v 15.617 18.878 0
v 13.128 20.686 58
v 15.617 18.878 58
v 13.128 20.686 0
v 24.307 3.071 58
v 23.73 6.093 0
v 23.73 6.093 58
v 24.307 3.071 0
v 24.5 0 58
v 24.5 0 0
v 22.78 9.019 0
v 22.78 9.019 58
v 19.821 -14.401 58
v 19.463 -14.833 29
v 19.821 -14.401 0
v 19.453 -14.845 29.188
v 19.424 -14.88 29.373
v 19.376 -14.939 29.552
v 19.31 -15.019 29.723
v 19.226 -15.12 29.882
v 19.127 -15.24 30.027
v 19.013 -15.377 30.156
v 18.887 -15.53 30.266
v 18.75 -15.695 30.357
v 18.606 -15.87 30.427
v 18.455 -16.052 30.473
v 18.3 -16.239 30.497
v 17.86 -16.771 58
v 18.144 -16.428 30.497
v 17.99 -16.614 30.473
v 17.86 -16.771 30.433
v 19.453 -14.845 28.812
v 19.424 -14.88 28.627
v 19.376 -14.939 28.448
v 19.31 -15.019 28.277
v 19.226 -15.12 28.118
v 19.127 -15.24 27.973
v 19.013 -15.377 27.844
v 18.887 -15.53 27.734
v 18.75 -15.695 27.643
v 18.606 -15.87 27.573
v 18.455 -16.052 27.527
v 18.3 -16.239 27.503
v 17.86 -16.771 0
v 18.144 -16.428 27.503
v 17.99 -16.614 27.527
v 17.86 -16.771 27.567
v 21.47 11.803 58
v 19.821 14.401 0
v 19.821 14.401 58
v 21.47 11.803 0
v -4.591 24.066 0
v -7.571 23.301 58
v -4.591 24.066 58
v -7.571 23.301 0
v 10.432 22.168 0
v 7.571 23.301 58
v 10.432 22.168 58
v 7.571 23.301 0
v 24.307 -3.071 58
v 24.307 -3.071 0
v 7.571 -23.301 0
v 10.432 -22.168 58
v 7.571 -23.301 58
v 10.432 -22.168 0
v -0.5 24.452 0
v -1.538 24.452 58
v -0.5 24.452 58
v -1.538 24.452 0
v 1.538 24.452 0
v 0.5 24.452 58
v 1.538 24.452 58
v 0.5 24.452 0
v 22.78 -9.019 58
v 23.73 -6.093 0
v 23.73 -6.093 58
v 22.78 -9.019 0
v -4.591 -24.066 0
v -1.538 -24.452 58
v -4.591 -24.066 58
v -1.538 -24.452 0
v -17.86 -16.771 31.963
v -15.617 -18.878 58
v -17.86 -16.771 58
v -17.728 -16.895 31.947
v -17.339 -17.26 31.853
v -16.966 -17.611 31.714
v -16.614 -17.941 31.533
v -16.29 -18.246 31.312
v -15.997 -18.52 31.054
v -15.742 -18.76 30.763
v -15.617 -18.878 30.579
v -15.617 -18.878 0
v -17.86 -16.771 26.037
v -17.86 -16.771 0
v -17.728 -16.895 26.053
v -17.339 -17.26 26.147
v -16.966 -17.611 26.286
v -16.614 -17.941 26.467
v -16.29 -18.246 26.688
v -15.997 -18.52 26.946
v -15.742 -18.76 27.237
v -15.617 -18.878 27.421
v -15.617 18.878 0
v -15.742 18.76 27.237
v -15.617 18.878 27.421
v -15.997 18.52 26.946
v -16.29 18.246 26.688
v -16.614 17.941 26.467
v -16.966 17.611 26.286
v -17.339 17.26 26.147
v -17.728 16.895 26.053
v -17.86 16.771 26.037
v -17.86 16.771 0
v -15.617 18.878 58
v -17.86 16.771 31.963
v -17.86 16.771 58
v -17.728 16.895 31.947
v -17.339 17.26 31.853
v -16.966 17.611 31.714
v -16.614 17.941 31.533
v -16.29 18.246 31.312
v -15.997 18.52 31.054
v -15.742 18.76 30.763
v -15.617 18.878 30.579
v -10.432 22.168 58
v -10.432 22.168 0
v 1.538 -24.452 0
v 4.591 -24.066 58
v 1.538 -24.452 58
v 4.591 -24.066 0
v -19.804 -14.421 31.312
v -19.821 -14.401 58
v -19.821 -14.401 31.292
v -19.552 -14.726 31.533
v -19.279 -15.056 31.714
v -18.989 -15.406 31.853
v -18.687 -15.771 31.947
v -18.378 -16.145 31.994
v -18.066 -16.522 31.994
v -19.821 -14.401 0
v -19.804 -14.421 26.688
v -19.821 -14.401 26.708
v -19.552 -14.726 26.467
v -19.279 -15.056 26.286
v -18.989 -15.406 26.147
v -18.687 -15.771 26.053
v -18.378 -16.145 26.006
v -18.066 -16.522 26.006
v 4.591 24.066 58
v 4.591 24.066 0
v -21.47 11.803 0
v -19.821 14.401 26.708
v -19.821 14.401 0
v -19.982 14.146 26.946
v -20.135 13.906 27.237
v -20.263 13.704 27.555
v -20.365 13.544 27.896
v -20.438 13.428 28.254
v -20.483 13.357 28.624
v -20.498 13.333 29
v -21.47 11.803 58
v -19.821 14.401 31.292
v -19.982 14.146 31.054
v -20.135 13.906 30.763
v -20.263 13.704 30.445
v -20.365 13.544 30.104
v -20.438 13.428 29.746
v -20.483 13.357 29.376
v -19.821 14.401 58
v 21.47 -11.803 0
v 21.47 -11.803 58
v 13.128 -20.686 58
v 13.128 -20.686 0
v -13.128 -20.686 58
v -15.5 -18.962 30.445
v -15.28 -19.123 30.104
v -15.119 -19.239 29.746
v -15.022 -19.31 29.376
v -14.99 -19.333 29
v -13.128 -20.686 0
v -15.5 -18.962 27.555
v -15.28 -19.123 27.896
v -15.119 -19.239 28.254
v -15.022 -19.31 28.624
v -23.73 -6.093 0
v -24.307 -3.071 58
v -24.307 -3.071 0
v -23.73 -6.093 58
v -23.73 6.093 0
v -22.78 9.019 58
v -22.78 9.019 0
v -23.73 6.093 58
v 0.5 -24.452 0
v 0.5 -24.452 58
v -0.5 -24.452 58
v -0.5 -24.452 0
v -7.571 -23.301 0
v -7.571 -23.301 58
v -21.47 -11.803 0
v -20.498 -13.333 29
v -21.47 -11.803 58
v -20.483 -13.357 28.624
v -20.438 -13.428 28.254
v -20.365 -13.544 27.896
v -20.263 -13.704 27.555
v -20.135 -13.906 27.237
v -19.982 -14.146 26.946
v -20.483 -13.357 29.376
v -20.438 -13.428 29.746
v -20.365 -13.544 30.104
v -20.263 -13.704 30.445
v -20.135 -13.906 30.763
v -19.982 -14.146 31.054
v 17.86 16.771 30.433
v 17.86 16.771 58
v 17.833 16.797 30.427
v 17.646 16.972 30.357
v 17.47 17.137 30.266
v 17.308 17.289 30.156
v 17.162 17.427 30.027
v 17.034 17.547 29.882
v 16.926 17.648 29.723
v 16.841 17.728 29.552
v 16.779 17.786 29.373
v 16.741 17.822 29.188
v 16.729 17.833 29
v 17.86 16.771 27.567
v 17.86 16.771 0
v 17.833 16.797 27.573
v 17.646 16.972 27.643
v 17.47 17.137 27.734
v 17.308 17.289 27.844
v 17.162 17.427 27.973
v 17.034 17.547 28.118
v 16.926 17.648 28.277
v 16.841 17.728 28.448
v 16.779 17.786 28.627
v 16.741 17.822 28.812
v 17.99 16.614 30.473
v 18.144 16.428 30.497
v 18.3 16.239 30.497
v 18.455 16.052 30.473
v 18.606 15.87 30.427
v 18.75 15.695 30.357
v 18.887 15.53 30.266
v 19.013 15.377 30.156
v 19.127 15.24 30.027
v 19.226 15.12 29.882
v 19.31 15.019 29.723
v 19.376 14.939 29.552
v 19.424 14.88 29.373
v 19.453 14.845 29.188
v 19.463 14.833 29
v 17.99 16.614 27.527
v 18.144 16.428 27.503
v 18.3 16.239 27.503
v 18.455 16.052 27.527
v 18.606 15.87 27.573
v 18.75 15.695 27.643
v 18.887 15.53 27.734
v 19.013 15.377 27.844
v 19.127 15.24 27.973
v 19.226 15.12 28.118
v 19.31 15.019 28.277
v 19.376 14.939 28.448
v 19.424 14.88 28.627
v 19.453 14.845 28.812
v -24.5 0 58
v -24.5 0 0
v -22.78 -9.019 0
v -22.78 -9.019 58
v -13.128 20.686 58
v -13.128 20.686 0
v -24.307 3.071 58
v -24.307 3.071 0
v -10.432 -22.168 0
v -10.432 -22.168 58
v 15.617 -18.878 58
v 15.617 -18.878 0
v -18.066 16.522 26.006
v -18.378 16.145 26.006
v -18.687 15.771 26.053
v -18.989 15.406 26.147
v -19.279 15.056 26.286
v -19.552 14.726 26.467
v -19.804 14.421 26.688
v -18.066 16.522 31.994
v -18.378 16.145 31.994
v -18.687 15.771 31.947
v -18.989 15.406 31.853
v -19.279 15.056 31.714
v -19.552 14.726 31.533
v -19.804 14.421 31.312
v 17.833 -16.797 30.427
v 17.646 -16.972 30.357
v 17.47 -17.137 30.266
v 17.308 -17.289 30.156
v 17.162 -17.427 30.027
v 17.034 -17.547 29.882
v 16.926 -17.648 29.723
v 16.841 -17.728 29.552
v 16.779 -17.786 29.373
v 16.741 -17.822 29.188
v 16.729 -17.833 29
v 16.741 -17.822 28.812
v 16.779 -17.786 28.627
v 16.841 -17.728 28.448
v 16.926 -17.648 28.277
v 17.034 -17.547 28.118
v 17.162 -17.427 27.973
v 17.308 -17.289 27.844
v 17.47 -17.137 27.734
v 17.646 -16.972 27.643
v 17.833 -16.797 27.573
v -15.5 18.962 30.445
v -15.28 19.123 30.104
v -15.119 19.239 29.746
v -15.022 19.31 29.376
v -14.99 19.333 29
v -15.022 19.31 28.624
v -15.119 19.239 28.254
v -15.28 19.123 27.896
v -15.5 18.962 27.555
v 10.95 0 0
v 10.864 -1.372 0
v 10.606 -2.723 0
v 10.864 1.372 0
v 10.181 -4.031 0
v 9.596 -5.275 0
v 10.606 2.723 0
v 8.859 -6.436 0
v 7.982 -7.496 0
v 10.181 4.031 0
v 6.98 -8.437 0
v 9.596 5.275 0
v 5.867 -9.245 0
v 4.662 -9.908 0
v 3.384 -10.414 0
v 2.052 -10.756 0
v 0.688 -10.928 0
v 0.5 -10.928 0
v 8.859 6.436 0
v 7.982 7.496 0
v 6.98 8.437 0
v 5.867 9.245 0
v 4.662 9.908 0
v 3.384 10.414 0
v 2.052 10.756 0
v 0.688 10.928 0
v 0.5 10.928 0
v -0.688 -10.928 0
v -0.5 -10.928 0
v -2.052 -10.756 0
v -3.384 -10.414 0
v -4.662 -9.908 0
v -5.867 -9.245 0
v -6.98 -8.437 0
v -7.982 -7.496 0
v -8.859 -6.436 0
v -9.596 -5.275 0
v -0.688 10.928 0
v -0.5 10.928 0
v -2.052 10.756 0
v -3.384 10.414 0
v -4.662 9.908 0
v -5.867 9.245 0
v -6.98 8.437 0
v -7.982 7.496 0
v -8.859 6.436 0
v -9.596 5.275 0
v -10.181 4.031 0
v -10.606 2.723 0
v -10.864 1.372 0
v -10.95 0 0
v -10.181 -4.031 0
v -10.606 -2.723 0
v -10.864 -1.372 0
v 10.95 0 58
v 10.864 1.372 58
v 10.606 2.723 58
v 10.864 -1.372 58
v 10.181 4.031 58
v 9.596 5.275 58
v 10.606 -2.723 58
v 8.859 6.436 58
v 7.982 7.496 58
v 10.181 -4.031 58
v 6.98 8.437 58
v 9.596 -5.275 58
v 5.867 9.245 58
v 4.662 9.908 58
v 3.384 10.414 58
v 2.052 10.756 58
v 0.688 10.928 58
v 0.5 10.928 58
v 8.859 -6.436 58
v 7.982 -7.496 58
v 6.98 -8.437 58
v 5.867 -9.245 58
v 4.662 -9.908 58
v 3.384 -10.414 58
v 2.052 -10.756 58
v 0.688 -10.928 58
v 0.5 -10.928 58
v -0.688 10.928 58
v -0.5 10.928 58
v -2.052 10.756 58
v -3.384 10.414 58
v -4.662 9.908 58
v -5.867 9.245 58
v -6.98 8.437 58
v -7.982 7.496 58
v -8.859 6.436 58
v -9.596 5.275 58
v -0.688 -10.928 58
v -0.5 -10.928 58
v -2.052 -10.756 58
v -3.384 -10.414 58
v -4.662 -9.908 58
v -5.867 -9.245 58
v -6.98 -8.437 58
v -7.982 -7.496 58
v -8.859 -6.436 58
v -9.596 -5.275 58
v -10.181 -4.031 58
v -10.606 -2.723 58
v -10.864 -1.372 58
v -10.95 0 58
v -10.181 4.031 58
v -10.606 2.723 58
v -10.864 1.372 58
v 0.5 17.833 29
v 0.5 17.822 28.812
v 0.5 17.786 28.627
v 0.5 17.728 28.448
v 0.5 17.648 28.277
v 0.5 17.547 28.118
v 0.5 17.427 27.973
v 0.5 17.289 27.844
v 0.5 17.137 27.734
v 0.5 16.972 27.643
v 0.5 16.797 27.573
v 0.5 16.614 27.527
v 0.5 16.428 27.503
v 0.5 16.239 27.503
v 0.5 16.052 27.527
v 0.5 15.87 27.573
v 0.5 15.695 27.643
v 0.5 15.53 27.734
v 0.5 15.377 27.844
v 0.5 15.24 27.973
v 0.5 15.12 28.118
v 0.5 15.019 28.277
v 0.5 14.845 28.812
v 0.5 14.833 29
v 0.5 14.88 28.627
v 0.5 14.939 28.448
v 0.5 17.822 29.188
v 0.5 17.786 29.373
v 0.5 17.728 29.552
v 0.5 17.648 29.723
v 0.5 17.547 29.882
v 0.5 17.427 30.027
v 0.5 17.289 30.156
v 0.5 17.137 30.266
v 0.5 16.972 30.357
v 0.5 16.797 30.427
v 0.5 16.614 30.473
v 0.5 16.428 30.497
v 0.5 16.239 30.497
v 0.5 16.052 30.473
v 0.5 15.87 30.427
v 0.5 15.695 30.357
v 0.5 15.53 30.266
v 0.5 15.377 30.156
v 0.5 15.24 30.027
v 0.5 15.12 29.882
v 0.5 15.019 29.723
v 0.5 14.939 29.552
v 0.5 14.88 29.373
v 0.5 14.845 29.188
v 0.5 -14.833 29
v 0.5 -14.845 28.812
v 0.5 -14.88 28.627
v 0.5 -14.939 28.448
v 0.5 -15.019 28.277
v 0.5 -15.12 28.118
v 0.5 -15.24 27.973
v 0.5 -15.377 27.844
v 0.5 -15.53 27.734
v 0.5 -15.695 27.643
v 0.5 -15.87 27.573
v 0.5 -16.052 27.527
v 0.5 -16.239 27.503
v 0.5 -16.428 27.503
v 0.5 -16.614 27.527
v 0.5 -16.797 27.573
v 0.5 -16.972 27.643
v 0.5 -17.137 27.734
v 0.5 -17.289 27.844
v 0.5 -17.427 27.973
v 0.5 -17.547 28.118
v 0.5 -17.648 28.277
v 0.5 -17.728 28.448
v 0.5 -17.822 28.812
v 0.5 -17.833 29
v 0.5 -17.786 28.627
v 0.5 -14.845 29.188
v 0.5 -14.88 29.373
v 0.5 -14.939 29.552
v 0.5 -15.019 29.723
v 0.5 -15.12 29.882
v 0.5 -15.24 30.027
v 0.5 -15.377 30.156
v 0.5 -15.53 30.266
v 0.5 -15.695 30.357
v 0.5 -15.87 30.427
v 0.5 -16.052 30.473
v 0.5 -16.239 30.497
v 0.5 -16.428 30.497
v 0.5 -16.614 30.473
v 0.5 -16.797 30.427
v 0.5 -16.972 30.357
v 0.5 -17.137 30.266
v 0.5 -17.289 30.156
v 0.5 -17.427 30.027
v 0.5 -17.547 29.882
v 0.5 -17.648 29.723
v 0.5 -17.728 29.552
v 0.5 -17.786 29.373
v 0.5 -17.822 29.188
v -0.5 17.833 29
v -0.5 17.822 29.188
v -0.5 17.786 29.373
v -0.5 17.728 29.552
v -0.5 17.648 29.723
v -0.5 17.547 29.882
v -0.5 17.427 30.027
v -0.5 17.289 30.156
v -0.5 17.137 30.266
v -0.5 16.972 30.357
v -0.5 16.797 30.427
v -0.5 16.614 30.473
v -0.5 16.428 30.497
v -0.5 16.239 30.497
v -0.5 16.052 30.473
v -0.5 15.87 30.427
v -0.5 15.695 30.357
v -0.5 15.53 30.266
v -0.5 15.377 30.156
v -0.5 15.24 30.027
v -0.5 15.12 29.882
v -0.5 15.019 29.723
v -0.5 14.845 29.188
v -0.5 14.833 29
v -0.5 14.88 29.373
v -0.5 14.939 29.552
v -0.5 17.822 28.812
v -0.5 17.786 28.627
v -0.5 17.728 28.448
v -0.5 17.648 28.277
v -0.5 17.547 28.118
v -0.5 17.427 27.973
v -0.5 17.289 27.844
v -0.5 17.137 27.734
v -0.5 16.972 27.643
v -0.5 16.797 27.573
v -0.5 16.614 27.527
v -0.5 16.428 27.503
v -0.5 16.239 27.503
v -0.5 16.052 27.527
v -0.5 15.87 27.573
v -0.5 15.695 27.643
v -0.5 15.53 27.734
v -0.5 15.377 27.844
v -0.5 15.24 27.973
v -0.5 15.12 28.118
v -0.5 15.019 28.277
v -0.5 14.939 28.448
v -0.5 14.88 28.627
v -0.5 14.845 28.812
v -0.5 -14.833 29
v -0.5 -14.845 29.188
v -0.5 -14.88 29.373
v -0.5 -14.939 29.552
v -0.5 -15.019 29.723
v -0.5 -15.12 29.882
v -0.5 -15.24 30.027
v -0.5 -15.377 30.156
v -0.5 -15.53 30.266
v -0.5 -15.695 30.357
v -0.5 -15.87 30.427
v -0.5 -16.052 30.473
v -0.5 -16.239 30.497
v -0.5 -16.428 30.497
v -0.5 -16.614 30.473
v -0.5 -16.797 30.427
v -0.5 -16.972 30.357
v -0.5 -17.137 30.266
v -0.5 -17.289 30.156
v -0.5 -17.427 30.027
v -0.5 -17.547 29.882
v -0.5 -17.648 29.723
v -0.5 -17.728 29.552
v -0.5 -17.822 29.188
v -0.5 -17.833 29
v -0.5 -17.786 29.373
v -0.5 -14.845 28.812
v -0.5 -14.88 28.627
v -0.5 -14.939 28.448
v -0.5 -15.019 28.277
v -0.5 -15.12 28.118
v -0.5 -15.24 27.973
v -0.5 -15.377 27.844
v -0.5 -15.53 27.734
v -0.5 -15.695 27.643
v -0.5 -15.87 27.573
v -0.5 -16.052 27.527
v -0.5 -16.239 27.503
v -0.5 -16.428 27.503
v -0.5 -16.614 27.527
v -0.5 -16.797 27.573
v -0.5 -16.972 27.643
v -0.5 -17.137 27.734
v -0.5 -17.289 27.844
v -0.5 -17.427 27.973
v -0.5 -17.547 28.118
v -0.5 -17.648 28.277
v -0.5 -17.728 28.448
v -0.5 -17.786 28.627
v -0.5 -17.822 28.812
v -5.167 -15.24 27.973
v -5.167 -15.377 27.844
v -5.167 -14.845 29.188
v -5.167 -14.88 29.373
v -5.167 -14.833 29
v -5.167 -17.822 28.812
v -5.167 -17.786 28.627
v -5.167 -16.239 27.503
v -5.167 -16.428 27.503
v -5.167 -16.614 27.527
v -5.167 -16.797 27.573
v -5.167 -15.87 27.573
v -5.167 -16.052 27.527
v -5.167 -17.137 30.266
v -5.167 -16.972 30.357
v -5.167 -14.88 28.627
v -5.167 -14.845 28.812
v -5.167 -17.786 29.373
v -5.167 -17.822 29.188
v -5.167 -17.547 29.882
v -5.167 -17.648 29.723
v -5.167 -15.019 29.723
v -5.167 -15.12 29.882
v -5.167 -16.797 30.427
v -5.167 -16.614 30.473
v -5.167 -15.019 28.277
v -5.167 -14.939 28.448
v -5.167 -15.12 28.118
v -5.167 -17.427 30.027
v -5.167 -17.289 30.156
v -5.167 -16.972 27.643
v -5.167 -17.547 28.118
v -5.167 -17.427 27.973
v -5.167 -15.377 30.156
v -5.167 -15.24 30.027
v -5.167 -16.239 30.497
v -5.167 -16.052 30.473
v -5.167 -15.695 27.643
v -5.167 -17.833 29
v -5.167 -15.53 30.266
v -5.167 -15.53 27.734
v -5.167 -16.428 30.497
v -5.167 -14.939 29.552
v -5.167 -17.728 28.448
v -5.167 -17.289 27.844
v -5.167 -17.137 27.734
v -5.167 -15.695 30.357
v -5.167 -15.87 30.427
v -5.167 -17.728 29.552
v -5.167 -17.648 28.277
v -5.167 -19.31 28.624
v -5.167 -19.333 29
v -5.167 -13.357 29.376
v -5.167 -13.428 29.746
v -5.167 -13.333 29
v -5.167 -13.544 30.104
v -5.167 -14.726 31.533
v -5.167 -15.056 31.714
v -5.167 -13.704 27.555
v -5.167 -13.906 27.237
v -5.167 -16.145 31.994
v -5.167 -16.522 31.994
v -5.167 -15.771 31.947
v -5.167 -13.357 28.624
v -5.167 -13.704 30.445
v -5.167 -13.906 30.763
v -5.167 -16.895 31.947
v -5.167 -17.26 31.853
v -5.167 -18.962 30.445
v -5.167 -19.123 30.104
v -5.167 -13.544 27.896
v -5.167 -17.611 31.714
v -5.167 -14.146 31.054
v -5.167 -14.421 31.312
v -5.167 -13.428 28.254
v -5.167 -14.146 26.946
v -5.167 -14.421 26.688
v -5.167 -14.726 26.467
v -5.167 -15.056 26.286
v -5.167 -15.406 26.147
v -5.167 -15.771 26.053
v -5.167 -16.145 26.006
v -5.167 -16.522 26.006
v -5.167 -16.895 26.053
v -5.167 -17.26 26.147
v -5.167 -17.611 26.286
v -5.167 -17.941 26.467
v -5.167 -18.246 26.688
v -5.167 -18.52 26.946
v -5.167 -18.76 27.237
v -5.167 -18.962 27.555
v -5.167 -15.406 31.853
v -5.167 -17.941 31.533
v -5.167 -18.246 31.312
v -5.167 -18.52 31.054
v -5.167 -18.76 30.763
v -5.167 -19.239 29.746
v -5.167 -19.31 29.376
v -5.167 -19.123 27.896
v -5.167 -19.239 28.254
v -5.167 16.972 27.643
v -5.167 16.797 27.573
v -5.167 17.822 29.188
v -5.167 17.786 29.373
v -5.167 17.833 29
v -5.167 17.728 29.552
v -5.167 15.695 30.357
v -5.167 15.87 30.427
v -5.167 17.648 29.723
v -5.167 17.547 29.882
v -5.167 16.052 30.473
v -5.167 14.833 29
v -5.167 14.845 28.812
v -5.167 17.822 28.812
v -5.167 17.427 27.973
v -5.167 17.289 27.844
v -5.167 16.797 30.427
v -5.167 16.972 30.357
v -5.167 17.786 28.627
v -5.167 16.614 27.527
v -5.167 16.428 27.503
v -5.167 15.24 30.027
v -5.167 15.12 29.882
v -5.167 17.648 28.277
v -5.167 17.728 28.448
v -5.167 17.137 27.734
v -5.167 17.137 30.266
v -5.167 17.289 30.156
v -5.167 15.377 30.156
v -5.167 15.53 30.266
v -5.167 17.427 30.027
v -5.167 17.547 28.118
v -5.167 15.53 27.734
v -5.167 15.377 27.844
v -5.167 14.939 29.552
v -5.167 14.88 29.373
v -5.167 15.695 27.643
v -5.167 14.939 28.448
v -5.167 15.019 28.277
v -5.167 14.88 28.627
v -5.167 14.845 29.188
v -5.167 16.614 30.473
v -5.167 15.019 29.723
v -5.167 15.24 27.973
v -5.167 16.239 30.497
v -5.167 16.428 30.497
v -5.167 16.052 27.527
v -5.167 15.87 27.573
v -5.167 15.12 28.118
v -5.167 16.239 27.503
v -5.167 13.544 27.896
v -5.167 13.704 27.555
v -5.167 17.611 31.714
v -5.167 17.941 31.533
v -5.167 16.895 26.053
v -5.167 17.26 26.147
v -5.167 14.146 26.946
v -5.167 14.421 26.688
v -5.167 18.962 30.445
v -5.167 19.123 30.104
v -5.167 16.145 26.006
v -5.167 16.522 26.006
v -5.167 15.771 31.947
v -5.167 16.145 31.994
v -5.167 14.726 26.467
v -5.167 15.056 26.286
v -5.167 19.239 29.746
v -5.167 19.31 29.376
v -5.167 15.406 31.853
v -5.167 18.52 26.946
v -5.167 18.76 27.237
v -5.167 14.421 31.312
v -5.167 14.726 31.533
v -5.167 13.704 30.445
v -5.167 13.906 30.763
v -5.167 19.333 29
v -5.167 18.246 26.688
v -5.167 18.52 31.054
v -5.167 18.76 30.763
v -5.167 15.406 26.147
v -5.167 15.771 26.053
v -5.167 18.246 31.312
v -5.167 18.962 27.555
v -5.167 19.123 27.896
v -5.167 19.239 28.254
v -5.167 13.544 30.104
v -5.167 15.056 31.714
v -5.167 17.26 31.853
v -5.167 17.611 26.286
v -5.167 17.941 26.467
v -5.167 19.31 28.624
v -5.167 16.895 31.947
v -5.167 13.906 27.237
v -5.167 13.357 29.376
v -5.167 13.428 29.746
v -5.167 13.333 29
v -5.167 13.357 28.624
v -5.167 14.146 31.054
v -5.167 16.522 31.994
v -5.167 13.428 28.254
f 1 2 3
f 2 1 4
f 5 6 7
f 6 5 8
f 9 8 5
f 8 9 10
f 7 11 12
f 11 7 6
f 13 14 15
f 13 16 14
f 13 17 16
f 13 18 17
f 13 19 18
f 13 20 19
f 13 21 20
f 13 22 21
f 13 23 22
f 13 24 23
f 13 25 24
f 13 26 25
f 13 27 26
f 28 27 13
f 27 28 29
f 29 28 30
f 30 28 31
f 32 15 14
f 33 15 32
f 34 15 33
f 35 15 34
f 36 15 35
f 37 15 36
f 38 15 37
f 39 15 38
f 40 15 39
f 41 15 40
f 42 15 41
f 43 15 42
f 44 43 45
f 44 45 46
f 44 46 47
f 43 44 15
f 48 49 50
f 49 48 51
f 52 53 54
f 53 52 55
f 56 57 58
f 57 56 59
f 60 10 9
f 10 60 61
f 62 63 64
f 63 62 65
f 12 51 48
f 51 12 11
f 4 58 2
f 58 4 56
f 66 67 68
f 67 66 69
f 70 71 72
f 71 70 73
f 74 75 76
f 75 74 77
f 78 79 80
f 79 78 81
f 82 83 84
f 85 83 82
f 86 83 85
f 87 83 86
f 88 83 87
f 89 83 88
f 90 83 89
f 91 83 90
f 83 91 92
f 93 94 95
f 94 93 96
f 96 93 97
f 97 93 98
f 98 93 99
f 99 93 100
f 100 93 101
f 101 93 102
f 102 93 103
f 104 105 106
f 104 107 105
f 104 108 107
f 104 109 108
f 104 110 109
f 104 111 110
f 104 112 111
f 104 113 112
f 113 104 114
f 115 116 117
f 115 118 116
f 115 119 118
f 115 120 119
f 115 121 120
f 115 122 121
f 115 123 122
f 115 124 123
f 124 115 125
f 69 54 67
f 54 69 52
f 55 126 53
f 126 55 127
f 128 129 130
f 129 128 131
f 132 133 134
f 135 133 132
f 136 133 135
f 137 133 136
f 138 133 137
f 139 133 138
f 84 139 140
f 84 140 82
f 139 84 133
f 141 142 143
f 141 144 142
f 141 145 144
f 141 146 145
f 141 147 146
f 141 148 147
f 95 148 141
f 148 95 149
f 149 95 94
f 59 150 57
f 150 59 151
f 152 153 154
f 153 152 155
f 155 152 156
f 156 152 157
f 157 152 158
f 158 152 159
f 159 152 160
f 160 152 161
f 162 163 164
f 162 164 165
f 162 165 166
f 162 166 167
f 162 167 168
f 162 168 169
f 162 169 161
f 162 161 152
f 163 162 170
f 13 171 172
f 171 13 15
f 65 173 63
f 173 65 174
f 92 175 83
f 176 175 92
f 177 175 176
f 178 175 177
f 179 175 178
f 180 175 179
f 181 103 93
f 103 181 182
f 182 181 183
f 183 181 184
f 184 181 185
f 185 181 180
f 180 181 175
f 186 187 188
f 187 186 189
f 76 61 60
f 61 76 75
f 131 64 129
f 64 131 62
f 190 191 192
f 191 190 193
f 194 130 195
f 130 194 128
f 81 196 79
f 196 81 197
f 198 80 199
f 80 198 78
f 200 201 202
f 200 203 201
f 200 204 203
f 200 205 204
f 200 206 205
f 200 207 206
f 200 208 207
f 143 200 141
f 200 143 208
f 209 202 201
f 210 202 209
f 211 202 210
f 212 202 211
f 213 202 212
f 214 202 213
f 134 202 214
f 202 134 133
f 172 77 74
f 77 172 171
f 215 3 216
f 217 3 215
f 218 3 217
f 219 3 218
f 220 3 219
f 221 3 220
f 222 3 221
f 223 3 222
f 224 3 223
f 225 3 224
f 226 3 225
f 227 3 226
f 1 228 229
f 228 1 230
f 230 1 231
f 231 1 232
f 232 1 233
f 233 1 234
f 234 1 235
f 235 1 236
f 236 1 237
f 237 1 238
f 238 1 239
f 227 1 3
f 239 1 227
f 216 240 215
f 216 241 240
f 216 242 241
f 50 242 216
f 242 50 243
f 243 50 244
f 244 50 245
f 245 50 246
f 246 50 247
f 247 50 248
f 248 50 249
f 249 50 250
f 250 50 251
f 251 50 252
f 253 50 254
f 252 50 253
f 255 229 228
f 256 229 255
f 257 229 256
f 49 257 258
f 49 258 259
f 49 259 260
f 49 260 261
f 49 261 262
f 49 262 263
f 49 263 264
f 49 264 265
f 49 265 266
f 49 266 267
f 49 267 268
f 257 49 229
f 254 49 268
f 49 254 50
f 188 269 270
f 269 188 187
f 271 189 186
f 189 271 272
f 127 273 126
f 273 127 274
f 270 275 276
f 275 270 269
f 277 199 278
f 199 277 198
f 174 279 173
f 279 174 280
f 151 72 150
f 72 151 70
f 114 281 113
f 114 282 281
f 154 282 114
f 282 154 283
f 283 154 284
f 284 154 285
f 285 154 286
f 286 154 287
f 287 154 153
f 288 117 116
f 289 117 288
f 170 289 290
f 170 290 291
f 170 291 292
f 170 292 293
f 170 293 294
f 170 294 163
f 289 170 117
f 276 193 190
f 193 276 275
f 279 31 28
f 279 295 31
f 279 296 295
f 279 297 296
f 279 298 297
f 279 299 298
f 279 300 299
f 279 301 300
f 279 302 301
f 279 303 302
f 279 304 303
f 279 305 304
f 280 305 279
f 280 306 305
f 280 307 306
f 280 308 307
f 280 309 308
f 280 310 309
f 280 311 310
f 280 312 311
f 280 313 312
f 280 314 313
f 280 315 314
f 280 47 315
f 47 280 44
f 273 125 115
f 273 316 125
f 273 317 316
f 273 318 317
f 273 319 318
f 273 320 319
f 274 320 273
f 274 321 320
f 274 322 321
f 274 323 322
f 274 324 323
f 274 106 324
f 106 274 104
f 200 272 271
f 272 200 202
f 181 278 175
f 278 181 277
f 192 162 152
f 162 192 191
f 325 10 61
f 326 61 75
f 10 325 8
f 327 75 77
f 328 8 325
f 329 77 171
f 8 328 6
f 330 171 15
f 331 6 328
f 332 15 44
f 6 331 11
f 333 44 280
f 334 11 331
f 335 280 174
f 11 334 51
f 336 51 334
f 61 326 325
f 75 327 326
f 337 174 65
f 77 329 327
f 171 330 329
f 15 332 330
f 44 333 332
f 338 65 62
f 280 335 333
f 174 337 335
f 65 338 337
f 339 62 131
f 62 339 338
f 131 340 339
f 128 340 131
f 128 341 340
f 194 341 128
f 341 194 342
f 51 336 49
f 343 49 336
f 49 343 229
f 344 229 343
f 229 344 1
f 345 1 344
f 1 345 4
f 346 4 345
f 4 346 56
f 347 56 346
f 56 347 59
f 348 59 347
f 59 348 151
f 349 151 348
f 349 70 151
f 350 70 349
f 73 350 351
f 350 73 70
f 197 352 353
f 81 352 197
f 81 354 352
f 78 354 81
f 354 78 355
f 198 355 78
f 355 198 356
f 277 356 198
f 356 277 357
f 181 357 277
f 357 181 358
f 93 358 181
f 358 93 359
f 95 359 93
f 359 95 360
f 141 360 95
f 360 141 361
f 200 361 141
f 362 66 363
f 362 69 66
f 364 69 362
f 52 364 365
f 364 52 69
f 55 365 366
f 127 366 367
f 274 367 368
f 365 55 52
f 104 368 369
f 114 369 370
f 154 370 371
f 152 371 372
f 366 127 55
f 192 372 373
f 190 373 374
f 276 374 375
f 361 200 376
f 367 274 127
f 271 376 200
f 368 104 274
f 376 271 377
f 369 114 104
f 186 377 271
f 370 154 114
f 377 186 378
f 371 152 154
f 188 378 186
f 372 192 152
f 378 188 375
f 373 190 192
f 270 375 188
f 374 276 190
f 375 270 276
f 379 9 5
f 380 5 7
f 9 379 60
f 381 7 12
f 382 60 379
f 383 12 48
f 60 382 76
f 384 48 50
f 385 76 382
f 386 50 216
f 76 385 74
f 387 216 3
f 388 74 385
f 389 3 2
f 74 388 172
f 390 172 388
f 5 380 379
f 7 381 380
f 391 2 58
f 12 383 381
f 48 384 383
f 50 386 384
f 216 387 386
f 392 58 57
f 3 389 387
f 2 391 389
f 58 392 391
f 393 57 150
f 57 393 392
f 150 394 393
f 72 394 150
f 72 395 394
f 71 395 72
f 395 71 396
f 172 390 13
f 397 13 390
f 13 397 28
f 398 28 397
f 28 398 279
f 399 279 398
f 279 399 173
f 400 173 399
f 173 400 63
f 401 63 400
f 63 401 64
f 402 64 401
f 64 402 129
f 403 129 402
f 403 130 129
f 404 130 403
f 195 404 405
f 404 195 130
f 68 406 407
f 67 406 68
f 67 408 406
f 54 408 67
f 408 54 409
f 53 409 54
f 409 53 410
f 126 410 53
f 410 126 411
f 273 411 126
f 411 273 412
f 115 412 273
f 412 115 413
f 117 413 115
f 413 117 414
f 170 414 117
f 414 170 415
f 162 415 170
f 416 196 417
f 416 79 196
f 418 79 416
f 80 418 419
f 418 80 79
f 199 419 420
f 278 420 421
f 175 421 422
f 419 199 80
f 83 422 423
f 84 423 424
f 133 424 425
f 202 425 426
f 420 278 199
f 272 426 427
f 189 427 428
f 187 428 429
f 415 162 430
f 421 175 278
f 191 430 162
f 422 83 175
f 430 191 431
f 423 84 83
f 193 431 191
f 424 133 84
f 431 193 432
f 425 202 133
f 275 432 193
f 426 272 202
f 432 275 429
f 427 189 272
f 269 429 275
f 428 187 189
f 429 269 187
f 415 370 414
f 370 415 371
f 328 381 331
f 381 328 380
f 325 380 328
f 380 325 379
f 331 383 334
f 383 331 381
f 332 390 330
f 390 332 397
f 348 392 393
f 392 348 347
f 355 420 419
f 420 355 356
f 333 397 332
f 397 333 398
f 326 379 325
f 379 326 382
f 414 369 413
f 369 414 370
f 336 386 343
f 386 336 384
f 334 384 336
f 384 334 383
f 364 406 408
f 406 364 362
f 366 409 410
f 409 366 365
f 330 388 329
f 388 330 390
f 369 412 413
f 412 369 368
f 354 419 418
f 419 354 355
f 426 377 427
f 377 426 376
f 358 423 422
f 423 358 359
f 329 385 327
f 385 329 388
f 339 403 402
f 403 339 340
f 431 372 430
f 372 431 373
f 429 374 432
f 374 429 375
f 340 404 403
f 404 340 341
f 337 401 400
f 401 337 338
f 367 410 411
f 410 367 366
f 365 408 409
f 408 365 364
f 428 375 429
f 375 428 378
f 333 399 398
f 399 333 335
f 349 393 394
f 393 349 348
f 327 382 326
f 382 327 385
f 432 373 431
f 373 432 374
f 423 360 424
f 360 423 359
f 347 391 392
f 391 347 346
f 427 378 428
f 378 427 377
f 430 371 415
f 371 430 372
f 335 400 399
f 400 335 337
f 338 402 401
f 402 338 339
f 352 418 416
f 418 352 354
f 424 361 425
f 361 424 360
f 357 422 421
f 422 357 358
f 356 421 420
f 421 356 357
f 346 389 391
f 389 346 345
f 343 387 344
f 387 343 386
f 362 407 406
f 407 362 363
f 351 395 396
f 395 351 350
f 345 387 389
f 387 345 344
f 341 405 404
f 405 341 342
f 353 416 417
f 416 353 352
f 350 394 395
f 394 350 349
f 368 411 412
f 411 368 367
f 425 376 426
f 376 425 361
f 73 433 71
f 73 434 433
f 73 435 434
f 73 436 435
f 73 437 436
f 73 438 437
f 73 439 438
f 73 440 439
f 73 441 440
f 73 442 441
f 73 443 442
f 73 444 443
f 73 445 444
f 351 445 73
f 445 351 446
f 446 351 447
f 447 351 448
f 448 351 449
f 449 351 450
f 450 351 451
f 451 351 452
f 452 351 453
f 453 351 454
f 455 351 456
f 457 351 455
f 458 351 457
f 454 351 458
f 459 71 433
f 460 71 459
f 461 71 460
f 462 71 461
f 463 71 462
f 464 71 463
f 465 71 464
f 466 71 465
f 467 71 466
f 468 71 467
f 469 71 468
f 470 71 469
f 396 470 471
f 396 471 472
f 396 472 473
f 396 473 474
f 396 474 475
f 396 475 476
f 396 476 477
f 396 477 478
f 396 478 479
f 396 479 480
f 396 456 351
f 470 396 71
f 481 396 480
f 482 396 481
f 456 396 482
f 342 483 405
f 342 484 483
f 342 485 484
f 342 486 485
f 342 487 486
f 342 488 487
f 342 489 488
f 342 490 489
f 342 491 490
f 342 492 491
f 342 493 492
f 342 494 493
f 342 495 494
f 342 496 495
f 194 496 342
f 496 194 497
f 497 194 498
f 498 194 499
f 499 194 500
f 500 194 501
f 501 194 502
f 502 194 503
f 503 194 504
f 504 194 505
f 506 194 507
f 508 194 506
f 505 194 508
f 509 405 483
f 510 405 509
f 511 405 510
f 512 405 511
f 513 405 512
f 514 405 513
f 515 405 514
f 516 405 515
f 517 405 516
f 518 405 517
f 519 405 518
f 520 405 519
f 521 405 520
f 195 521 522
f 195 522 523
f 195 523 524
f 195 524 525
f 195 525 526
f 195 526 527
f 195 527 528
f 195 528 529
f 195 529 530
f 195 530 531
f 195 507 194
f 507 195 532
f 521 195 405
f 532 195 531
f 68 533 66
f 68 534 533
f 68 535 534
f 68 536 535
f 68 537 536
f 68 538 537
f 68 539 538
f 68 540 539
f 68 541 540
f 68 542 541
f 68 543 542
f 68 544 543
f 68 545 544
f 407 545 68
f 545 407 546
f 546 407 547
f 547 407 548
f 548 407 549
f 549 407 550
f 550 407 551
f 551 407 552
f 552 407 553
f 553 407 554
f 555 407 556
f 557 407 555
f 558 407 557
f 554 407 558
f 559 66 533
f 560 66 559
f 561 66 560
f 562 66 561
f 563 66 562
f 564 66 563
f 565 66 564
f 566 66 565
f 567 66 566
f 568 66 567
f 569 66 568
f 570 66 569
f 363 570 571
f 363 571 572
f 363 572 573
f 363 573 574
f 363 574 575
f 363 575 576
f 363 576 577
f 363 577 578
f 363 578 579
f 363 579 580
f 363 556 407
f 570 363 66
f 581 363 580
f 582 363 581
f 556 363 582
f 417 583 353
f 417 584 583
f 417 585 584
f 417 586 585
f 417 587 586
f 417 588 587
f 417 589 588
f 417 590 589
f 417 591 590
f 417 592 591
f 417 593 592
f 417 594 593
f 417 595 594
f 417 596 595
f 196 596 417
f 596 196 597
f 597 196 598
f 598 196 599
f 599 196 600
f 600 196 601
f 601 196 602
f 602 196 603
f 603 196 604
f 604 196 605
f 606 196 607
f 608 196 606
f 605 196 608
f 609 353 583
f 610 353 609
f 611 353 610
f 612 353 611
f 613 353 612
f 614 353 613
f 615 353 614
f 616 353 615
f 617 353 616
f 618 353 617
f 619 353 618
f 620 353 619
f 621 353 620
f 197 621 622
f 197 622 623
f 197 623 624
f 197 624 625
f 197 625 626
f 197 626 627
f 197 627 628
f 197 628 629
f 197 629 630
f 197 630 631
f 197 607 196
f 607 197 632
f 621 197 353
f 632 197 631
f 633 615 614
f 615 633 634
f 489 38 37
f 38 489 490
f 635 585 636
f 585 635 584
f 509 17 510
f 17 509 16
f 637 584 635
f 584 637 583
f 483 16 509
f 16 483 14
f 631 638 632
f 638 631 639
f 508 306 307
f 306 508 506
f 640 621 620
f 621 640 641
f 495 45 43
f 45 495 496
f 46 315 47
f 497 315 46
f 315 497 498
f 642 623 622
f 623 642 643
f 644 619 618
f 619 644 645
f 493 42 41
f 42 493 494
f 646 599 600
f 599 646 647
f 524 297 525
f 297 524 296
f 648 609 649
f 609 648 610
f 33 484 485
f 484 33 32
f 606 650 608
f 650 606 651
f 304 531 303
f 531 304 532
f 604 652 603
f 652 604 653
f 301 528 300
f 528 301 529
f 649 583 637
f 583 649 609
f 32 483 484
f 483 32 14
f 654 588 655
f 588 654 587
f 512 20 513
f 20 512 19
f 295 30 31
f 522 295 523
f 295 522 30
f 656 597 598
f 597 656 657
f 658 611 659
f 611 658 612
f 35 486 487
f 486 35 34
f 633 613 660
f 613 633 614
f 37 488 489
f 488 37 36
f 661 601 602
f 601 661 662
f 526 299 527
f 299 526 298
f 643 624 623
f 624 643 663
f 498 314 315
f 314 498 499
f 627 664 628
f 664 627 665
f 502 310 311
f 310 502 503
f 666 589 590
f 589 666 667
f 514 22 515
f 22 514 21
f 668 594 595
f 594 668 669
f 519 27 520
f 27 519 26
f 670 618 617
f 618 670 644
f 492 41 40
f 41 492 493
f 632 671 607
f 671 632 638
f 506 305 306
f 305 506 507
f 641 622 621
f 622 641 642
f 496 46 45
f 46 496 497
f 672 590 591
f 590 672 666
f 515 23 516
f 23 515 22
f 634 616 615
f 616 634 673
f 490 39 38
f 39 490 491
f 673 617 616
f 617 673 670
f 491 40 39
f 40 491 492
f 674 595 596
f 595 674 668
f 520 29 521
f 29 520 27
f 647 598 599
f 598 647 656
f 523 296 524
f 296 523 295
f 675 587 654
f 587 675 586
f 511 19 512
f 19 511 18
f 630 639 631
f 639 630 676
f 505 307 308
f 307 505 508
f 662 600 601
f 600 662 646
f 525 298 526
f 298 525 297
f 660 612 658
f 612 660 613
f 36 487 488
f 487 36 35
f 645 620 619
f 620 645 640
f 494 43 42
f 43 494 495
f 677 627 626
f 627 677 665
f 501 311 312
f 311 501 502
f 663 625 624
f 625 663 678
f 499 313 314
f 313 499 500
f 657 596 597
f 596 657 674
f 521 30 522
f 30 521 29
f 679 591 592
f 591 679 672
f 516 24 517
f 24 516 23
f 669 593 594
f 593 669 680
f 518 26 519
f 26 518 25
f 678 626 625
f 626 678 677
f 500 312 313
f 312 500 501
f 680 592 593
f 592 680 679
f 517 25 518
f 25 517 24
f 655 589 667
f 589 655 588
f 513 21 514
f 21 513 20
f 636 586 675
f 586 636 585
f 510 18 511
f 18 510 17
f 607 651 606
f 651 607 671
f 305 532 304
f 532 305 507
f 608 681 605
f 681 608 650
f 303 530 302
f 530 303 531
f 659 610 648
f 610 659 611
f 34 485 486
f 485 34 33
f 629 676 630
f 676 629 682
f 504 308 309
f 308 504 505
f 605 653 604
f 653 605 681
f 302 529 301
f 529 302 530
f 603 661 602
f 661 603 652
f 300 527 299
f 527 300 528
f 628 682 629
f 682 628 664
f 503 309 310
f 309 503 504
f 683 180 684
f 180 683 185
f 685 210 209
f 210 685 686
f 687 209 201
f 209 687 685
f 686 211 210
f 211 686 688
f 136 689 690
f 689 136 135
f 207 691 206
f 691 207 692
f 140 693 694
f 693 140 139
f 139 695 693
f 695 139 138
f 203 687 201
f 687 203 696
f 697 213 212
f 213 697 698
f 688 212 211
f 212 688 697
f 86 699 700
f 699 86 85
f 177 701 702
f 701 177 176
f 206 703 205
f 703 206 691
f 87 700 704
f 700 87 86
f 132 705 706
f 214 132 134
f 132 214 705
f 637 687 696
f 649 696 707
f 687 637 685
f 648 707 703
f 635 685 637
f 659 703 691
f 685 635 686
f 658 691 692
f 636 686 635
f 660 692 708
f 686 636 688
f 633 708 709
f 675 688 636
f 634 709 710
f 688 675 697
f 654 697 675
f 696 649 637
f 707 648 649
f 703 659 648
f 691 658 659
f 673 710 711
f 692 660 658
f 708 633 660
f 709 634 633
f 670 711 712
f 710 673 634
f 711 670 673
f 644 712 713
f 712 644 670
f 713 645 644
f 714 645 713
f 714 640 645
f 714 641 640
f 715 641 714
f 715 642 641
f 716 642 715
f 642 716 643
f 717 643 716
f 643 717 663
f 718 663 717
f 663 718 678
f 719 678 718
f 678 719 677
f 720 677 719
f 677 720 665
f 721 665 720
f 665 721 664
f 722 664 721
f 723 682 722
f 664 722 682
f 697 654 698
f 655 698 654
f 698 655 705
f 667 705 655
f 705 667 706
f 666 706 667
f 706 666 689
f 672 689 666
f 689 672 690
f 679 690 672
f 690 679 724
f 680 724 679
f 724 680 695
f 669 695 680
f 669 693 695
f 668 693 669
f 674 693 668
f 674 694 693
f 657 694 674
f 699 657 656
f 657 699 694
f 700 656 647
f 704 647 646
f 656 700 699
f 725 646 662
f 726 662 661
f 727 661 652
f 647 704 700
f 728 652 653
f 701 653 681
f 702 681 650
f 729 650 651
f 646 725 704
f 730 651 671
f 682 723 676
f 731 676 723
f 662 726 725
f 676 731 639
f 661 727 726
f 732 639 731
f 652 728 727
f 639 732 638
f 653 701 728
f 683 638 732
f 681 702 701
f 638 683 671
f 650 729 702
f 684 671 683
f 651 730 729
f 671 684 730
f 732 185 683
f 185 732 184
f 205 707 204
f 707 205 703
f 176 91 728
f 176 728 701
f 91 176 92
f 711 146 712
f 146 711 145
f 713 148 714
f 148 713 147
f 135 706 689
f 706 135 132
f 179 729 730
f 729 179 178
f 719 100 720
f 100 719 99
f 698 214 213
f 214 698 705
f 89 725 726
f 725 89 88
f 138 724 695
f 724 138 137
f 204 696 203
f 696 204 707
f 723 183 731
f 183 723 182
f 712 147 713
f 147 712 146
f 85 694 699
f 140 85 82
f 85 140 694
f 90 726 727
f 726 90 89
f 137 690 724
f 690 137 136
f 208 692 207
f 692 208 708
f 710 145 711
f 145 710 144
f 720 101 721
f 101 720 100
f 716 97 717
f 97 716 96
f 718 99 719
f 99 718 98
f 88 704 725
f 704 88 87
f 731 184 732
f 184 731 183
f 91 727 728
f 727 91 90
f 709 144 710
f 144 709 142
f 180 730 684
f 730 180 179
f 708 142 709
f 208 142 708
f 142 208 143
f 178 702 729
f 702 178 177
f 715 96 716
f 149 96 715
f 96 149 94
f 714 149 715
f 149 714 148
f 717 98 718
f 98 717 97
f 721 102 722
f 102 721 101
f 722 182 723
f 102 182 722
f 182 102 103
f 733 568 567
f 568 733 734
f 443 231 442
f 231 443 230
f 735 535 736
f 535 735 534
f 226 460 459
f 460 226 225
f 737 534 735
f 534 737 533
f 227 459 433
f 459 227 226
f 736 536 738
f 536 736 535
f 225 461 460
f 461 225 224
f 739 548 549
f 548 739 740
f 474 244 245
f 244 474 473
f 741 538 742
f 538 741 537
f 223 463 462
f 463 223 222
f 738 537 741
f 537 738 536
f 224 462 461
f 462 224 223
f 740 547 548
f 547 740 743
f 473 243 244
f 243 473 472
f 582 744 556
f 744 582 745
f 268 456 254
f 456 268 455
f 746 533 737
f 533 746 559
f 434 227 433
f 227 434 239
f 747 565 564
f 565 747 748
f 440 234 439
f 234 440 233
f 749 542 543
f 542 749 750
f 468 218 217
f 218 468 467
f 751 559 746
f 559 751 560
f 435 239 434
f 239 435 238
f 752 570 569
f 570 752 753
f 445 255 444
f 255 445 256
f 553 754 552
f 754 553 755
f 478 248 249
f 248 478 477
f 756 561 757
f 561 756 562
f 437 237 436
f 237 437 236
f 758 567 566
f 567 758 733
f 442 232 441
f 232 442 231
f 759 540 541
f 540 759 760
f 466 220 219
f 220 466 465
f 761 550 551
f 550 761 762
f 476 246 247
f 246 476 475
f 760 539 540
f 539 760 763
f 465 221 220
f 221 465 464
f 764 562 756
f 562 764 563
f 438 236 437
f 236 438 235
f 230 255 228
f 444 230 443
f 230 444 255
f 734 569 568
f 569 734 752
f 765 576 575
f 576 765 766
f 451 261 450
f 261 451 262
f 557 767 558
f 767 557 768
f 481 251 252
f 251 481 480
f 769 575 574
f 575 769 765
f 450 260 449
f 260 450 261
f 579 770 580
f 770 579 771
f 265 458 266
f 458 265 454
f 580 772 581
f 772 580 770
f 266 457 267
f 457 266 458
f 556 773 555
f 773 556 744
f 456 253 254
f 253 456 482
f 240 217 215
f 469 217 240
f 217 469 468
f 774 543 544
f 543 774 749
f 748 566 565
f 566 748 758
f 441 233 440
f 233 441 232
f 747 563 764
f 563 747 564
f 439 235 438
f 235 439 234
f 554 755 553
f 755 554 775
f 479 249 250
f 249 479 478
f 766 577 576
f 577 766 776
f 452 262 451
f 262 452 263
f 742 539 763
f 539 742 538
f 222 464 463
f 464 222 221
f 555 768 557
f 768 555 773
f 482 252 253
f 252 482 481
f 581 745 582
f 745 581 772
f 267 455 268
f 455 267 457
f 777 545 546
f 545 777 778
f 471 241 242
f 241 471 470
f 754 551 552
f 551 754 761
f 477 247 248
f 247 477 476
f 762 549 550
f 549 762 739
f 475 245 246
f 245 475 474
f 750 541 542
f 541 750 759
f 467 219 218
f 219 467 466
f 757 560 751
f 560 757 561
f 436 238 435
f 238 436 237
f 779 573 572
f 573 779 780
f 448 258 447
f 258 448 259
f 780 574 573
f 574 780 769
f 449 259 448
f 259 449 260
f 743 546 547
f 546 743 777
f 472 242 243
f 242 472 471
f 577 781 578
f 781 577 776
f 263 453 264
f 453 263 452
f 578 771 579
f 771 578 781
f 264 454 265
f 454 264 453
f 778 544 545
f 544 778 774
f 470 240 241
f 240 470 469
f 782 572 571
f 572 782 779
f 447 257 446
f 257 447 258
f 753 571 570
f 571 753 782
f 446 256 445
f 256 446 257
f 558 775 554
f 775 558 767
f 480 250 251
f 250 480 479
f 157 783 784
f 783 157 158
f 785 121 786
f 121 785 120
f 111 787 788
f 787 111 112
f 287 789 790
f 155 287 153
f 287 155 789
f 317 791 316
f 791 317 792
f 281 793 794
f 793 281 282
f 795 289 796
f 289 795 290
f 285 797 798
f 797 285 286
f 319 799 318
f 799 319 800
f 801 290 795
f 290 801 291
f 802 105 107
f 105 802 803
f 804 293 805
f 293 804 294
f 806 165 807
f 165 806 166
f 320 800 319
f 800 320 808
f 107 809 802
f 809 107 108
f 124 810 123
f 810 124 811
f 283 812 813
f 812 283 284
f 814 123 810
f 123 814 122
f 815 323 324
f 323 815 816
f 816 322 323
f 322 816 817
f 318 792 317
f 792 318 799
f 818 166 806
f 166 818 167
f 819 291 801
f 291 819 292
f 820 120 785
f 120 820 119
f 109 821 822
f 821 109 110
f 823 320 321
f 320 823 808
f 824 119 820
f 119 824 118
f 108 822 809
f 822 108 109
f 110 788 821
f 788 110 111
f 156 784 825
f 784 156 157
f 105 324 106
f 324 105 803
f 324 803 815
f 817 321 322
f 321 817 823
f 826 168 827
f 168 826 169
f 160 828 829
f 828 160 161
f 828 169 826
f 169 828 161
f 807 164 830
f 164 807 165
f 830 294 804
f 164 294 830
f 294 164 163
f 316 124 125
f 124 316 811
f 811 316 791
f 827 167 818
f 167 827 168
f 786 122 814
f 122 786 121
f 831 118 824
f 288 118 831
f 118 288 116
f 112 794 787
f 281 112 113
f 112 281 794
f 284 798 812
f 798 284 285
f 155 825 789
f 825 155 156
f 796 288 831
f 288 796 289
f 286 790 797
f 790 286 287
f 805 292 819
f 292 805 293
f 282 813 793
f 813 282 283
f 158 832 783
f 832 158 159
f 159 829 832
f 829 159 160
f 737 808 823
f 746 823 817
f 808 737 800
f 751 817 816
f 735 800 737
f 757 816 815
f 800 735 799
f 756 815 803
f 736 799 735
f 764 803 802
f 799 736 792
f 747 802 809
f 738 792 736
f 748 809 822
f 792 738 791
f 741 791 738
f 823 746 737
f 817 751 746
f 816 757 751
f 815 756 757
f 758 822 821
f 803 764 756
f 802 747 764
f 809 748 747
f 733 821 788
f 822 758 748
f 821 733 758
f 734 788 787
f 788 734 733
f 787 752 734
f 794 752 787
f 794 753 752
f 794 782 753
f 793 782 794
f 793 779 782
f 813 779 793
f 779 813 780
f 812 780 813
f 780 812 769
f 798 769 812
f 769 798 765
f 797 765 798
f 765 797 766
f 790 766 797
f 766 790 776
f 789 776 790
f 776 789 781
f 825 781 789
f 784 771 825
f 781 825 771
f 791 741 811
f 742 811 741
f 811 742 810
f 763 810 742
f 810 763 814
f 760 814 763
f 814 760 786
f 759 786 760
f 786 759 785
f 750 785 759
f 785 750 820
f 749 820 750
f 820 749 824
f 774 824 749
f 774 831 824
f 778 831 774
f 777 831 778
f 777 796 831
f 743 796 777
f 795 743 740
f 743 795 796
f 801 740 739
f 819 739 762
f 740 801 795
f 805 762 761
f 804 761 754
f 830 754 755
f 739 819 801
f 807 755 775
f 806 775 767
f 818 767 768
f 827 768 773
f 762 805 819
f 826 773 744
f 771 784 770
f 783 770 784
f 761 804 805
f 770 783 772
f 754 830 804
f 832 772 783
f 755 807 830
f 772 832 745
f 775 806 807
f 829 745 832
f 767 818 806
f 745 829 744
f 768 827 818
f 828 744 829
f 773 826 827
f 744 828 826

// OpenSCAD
/******************************************************************************/
/**********                     INFO                                 **********/
/******************************************************************************/
/*
Tripod Antenna Mount Spacer 1.0 May 2016
by David Buhler
Used to mount amatuer radio antennas with a post mount u-bracket to a tripod. 
I used an old camera tripod that works perfectly for this.

Attribution-NonCommercial 3.0 (CC BY-NC 3.0)
http://creativecommons.org/licenses/by-nc/3.0/
*/
/******************************************************************************/
/**********                     Settings                             **********/
/******************************************************************************/
//adjust the follow to meet your needs,  all measurements in mm.

/* [Spacer Sizing] */
//Top Tripod Ring Diameter
outer_ring=49;//[5:100] 
//Tripod Post Diameter
tripod_post=21.9;//[5:100]
//Height of the Spacer
mount_height=58;//[5:100]
//Screw Thread Diameter
screw_diameter=3;//[1:7]
//Screw Head Diameter
screw_head_dia=6;//[2:15]

/******************************************************************************/
/**********                   Variable Calcs                         **********/
/****                     no need to adjust these                      ********/
/******************************************************************************/
/* [HIDDEN] */

/******************************************************************************/
/**********                  Make It Happen Stuff                    **********/
/******************************************************************************/
$fn=50;
difference (){
cylinder(d=outer_ring,h=mount_height);
cylinder(d=tripod_post,h=mount_height);//post hole
translate ([-0.5,-outer_ring/2-0.01,-.01]) 
   cube([1,outer_ring+2,mount_height+2]);
translate ([-outer_ring/2,-outer_ring/3,mount_height/2])rotate([90,0,90]) 
   screw_hole();
translate ([-outer_ring/2+screw_head_dia-3,-outer_ring/3,mount_height/2])rotate([90,0,90]) 
   screw_head();
translate ([-outer_ring/2,outer_ring/3,mount_height/2])rotate([90,0,90]) 
   screw_hole();
translate ([-outer_ring/2+screw_head_dia-3,outer_ring/3,mount_height/2])rotate([90,0,90]) 
   screw_head();
}
/******************************************************************************/
/**********                         Modules                          **********/
/******************************************************************************/
module screw_hole(){
     cylinder(d=screw_diameter,h=outer_ring); 
}
module screw_head(){
    cylinder(d=screw_head_dia,h=outer_ring/3); 
}
